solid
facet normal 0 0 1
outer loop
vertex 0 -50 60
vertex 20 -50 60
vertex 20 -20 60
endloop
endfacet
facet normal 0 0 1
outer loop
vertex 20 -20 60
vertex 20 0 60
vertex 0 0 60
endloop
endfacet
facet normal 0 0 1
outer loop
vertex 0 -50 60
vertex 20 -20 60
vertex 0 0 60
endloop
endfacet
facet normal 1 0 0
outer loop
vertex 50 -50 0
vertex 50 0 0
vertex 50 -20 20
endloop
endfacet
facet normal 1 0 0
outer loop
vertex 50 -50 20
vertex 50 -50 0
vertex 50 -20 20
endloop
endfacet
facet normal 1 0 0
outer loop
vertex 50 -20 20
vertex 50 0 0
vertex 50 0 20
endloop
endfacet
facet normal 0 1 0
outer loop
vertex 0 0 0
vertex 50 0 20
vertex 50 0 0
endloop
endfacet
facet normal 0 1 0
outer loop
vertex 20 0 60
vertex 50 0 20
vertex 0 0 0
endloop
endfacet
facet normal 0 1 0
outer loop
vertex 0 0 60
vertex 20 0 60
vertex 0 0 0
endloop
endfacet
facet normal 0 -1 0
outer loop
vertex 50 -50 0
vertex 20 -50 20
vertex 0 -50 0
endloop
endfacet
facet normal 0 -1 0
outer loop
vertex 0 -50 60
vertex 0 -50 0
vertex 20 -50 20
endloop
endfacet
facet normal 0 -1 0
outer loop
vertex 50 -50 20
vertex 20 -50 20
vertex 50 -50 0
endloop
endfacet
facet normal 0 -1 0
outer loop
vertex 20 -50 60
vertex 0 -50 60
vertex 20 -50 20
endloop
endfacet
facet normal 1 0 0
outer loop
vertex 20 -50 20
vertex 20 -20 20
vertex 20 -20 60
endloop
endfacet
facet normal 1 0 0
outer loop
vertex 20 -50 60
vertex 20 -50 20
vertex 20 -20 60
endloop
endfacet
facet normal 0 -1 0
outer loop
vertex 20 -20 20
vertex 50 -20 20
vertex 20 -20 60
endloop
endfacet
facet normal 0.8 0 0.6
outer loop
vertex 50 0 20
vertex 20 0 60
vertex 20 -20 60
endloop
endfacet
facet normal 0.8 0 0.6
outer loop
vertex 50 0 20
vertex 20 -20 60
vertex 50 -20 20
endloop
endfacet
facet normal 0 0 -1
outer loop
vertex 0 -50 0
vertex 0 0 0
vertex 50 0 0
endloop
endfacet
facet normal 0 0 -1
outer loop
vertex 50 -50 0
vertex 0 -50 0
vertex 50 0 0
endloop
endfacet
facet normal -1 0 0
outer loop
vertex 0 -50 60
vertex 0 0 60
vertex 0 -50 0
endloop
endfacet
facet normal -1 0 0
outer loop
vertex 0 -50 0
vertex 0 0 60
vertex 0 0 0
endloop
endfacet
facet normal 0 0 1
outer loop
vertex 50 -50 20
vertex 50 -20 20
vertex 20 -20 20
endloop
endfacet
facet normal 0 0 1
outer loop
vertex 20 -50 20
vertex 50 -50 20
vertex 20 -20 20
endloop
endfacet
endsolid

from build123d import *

# Parameters (mm, degrees)
F1_DEPTH = 50
F3_DEPTH = 20


with BuildPart() as f1:
    # F0 (on Front) → F1 (new body)
    with BuildSketch(Plane.XZ):
        Polygon((0, 60), (0, 0), (50, 0), (50, 20), (20, 20), (20, 60), align=None)
    extrude(amount=F1_DEPTH)

    # F2 (on face) → F3 (join)
    with BuildSketch(Plane(origin=(0, 0, 0), x_dir=(-1, 0, 0), z_dir=(0, 1, 0))):
        Polygon((-20, 20), (-20, 60), (-50, 20), align=None)
    extrude(amount=-F3_DEPTH)


solid = f1.part
